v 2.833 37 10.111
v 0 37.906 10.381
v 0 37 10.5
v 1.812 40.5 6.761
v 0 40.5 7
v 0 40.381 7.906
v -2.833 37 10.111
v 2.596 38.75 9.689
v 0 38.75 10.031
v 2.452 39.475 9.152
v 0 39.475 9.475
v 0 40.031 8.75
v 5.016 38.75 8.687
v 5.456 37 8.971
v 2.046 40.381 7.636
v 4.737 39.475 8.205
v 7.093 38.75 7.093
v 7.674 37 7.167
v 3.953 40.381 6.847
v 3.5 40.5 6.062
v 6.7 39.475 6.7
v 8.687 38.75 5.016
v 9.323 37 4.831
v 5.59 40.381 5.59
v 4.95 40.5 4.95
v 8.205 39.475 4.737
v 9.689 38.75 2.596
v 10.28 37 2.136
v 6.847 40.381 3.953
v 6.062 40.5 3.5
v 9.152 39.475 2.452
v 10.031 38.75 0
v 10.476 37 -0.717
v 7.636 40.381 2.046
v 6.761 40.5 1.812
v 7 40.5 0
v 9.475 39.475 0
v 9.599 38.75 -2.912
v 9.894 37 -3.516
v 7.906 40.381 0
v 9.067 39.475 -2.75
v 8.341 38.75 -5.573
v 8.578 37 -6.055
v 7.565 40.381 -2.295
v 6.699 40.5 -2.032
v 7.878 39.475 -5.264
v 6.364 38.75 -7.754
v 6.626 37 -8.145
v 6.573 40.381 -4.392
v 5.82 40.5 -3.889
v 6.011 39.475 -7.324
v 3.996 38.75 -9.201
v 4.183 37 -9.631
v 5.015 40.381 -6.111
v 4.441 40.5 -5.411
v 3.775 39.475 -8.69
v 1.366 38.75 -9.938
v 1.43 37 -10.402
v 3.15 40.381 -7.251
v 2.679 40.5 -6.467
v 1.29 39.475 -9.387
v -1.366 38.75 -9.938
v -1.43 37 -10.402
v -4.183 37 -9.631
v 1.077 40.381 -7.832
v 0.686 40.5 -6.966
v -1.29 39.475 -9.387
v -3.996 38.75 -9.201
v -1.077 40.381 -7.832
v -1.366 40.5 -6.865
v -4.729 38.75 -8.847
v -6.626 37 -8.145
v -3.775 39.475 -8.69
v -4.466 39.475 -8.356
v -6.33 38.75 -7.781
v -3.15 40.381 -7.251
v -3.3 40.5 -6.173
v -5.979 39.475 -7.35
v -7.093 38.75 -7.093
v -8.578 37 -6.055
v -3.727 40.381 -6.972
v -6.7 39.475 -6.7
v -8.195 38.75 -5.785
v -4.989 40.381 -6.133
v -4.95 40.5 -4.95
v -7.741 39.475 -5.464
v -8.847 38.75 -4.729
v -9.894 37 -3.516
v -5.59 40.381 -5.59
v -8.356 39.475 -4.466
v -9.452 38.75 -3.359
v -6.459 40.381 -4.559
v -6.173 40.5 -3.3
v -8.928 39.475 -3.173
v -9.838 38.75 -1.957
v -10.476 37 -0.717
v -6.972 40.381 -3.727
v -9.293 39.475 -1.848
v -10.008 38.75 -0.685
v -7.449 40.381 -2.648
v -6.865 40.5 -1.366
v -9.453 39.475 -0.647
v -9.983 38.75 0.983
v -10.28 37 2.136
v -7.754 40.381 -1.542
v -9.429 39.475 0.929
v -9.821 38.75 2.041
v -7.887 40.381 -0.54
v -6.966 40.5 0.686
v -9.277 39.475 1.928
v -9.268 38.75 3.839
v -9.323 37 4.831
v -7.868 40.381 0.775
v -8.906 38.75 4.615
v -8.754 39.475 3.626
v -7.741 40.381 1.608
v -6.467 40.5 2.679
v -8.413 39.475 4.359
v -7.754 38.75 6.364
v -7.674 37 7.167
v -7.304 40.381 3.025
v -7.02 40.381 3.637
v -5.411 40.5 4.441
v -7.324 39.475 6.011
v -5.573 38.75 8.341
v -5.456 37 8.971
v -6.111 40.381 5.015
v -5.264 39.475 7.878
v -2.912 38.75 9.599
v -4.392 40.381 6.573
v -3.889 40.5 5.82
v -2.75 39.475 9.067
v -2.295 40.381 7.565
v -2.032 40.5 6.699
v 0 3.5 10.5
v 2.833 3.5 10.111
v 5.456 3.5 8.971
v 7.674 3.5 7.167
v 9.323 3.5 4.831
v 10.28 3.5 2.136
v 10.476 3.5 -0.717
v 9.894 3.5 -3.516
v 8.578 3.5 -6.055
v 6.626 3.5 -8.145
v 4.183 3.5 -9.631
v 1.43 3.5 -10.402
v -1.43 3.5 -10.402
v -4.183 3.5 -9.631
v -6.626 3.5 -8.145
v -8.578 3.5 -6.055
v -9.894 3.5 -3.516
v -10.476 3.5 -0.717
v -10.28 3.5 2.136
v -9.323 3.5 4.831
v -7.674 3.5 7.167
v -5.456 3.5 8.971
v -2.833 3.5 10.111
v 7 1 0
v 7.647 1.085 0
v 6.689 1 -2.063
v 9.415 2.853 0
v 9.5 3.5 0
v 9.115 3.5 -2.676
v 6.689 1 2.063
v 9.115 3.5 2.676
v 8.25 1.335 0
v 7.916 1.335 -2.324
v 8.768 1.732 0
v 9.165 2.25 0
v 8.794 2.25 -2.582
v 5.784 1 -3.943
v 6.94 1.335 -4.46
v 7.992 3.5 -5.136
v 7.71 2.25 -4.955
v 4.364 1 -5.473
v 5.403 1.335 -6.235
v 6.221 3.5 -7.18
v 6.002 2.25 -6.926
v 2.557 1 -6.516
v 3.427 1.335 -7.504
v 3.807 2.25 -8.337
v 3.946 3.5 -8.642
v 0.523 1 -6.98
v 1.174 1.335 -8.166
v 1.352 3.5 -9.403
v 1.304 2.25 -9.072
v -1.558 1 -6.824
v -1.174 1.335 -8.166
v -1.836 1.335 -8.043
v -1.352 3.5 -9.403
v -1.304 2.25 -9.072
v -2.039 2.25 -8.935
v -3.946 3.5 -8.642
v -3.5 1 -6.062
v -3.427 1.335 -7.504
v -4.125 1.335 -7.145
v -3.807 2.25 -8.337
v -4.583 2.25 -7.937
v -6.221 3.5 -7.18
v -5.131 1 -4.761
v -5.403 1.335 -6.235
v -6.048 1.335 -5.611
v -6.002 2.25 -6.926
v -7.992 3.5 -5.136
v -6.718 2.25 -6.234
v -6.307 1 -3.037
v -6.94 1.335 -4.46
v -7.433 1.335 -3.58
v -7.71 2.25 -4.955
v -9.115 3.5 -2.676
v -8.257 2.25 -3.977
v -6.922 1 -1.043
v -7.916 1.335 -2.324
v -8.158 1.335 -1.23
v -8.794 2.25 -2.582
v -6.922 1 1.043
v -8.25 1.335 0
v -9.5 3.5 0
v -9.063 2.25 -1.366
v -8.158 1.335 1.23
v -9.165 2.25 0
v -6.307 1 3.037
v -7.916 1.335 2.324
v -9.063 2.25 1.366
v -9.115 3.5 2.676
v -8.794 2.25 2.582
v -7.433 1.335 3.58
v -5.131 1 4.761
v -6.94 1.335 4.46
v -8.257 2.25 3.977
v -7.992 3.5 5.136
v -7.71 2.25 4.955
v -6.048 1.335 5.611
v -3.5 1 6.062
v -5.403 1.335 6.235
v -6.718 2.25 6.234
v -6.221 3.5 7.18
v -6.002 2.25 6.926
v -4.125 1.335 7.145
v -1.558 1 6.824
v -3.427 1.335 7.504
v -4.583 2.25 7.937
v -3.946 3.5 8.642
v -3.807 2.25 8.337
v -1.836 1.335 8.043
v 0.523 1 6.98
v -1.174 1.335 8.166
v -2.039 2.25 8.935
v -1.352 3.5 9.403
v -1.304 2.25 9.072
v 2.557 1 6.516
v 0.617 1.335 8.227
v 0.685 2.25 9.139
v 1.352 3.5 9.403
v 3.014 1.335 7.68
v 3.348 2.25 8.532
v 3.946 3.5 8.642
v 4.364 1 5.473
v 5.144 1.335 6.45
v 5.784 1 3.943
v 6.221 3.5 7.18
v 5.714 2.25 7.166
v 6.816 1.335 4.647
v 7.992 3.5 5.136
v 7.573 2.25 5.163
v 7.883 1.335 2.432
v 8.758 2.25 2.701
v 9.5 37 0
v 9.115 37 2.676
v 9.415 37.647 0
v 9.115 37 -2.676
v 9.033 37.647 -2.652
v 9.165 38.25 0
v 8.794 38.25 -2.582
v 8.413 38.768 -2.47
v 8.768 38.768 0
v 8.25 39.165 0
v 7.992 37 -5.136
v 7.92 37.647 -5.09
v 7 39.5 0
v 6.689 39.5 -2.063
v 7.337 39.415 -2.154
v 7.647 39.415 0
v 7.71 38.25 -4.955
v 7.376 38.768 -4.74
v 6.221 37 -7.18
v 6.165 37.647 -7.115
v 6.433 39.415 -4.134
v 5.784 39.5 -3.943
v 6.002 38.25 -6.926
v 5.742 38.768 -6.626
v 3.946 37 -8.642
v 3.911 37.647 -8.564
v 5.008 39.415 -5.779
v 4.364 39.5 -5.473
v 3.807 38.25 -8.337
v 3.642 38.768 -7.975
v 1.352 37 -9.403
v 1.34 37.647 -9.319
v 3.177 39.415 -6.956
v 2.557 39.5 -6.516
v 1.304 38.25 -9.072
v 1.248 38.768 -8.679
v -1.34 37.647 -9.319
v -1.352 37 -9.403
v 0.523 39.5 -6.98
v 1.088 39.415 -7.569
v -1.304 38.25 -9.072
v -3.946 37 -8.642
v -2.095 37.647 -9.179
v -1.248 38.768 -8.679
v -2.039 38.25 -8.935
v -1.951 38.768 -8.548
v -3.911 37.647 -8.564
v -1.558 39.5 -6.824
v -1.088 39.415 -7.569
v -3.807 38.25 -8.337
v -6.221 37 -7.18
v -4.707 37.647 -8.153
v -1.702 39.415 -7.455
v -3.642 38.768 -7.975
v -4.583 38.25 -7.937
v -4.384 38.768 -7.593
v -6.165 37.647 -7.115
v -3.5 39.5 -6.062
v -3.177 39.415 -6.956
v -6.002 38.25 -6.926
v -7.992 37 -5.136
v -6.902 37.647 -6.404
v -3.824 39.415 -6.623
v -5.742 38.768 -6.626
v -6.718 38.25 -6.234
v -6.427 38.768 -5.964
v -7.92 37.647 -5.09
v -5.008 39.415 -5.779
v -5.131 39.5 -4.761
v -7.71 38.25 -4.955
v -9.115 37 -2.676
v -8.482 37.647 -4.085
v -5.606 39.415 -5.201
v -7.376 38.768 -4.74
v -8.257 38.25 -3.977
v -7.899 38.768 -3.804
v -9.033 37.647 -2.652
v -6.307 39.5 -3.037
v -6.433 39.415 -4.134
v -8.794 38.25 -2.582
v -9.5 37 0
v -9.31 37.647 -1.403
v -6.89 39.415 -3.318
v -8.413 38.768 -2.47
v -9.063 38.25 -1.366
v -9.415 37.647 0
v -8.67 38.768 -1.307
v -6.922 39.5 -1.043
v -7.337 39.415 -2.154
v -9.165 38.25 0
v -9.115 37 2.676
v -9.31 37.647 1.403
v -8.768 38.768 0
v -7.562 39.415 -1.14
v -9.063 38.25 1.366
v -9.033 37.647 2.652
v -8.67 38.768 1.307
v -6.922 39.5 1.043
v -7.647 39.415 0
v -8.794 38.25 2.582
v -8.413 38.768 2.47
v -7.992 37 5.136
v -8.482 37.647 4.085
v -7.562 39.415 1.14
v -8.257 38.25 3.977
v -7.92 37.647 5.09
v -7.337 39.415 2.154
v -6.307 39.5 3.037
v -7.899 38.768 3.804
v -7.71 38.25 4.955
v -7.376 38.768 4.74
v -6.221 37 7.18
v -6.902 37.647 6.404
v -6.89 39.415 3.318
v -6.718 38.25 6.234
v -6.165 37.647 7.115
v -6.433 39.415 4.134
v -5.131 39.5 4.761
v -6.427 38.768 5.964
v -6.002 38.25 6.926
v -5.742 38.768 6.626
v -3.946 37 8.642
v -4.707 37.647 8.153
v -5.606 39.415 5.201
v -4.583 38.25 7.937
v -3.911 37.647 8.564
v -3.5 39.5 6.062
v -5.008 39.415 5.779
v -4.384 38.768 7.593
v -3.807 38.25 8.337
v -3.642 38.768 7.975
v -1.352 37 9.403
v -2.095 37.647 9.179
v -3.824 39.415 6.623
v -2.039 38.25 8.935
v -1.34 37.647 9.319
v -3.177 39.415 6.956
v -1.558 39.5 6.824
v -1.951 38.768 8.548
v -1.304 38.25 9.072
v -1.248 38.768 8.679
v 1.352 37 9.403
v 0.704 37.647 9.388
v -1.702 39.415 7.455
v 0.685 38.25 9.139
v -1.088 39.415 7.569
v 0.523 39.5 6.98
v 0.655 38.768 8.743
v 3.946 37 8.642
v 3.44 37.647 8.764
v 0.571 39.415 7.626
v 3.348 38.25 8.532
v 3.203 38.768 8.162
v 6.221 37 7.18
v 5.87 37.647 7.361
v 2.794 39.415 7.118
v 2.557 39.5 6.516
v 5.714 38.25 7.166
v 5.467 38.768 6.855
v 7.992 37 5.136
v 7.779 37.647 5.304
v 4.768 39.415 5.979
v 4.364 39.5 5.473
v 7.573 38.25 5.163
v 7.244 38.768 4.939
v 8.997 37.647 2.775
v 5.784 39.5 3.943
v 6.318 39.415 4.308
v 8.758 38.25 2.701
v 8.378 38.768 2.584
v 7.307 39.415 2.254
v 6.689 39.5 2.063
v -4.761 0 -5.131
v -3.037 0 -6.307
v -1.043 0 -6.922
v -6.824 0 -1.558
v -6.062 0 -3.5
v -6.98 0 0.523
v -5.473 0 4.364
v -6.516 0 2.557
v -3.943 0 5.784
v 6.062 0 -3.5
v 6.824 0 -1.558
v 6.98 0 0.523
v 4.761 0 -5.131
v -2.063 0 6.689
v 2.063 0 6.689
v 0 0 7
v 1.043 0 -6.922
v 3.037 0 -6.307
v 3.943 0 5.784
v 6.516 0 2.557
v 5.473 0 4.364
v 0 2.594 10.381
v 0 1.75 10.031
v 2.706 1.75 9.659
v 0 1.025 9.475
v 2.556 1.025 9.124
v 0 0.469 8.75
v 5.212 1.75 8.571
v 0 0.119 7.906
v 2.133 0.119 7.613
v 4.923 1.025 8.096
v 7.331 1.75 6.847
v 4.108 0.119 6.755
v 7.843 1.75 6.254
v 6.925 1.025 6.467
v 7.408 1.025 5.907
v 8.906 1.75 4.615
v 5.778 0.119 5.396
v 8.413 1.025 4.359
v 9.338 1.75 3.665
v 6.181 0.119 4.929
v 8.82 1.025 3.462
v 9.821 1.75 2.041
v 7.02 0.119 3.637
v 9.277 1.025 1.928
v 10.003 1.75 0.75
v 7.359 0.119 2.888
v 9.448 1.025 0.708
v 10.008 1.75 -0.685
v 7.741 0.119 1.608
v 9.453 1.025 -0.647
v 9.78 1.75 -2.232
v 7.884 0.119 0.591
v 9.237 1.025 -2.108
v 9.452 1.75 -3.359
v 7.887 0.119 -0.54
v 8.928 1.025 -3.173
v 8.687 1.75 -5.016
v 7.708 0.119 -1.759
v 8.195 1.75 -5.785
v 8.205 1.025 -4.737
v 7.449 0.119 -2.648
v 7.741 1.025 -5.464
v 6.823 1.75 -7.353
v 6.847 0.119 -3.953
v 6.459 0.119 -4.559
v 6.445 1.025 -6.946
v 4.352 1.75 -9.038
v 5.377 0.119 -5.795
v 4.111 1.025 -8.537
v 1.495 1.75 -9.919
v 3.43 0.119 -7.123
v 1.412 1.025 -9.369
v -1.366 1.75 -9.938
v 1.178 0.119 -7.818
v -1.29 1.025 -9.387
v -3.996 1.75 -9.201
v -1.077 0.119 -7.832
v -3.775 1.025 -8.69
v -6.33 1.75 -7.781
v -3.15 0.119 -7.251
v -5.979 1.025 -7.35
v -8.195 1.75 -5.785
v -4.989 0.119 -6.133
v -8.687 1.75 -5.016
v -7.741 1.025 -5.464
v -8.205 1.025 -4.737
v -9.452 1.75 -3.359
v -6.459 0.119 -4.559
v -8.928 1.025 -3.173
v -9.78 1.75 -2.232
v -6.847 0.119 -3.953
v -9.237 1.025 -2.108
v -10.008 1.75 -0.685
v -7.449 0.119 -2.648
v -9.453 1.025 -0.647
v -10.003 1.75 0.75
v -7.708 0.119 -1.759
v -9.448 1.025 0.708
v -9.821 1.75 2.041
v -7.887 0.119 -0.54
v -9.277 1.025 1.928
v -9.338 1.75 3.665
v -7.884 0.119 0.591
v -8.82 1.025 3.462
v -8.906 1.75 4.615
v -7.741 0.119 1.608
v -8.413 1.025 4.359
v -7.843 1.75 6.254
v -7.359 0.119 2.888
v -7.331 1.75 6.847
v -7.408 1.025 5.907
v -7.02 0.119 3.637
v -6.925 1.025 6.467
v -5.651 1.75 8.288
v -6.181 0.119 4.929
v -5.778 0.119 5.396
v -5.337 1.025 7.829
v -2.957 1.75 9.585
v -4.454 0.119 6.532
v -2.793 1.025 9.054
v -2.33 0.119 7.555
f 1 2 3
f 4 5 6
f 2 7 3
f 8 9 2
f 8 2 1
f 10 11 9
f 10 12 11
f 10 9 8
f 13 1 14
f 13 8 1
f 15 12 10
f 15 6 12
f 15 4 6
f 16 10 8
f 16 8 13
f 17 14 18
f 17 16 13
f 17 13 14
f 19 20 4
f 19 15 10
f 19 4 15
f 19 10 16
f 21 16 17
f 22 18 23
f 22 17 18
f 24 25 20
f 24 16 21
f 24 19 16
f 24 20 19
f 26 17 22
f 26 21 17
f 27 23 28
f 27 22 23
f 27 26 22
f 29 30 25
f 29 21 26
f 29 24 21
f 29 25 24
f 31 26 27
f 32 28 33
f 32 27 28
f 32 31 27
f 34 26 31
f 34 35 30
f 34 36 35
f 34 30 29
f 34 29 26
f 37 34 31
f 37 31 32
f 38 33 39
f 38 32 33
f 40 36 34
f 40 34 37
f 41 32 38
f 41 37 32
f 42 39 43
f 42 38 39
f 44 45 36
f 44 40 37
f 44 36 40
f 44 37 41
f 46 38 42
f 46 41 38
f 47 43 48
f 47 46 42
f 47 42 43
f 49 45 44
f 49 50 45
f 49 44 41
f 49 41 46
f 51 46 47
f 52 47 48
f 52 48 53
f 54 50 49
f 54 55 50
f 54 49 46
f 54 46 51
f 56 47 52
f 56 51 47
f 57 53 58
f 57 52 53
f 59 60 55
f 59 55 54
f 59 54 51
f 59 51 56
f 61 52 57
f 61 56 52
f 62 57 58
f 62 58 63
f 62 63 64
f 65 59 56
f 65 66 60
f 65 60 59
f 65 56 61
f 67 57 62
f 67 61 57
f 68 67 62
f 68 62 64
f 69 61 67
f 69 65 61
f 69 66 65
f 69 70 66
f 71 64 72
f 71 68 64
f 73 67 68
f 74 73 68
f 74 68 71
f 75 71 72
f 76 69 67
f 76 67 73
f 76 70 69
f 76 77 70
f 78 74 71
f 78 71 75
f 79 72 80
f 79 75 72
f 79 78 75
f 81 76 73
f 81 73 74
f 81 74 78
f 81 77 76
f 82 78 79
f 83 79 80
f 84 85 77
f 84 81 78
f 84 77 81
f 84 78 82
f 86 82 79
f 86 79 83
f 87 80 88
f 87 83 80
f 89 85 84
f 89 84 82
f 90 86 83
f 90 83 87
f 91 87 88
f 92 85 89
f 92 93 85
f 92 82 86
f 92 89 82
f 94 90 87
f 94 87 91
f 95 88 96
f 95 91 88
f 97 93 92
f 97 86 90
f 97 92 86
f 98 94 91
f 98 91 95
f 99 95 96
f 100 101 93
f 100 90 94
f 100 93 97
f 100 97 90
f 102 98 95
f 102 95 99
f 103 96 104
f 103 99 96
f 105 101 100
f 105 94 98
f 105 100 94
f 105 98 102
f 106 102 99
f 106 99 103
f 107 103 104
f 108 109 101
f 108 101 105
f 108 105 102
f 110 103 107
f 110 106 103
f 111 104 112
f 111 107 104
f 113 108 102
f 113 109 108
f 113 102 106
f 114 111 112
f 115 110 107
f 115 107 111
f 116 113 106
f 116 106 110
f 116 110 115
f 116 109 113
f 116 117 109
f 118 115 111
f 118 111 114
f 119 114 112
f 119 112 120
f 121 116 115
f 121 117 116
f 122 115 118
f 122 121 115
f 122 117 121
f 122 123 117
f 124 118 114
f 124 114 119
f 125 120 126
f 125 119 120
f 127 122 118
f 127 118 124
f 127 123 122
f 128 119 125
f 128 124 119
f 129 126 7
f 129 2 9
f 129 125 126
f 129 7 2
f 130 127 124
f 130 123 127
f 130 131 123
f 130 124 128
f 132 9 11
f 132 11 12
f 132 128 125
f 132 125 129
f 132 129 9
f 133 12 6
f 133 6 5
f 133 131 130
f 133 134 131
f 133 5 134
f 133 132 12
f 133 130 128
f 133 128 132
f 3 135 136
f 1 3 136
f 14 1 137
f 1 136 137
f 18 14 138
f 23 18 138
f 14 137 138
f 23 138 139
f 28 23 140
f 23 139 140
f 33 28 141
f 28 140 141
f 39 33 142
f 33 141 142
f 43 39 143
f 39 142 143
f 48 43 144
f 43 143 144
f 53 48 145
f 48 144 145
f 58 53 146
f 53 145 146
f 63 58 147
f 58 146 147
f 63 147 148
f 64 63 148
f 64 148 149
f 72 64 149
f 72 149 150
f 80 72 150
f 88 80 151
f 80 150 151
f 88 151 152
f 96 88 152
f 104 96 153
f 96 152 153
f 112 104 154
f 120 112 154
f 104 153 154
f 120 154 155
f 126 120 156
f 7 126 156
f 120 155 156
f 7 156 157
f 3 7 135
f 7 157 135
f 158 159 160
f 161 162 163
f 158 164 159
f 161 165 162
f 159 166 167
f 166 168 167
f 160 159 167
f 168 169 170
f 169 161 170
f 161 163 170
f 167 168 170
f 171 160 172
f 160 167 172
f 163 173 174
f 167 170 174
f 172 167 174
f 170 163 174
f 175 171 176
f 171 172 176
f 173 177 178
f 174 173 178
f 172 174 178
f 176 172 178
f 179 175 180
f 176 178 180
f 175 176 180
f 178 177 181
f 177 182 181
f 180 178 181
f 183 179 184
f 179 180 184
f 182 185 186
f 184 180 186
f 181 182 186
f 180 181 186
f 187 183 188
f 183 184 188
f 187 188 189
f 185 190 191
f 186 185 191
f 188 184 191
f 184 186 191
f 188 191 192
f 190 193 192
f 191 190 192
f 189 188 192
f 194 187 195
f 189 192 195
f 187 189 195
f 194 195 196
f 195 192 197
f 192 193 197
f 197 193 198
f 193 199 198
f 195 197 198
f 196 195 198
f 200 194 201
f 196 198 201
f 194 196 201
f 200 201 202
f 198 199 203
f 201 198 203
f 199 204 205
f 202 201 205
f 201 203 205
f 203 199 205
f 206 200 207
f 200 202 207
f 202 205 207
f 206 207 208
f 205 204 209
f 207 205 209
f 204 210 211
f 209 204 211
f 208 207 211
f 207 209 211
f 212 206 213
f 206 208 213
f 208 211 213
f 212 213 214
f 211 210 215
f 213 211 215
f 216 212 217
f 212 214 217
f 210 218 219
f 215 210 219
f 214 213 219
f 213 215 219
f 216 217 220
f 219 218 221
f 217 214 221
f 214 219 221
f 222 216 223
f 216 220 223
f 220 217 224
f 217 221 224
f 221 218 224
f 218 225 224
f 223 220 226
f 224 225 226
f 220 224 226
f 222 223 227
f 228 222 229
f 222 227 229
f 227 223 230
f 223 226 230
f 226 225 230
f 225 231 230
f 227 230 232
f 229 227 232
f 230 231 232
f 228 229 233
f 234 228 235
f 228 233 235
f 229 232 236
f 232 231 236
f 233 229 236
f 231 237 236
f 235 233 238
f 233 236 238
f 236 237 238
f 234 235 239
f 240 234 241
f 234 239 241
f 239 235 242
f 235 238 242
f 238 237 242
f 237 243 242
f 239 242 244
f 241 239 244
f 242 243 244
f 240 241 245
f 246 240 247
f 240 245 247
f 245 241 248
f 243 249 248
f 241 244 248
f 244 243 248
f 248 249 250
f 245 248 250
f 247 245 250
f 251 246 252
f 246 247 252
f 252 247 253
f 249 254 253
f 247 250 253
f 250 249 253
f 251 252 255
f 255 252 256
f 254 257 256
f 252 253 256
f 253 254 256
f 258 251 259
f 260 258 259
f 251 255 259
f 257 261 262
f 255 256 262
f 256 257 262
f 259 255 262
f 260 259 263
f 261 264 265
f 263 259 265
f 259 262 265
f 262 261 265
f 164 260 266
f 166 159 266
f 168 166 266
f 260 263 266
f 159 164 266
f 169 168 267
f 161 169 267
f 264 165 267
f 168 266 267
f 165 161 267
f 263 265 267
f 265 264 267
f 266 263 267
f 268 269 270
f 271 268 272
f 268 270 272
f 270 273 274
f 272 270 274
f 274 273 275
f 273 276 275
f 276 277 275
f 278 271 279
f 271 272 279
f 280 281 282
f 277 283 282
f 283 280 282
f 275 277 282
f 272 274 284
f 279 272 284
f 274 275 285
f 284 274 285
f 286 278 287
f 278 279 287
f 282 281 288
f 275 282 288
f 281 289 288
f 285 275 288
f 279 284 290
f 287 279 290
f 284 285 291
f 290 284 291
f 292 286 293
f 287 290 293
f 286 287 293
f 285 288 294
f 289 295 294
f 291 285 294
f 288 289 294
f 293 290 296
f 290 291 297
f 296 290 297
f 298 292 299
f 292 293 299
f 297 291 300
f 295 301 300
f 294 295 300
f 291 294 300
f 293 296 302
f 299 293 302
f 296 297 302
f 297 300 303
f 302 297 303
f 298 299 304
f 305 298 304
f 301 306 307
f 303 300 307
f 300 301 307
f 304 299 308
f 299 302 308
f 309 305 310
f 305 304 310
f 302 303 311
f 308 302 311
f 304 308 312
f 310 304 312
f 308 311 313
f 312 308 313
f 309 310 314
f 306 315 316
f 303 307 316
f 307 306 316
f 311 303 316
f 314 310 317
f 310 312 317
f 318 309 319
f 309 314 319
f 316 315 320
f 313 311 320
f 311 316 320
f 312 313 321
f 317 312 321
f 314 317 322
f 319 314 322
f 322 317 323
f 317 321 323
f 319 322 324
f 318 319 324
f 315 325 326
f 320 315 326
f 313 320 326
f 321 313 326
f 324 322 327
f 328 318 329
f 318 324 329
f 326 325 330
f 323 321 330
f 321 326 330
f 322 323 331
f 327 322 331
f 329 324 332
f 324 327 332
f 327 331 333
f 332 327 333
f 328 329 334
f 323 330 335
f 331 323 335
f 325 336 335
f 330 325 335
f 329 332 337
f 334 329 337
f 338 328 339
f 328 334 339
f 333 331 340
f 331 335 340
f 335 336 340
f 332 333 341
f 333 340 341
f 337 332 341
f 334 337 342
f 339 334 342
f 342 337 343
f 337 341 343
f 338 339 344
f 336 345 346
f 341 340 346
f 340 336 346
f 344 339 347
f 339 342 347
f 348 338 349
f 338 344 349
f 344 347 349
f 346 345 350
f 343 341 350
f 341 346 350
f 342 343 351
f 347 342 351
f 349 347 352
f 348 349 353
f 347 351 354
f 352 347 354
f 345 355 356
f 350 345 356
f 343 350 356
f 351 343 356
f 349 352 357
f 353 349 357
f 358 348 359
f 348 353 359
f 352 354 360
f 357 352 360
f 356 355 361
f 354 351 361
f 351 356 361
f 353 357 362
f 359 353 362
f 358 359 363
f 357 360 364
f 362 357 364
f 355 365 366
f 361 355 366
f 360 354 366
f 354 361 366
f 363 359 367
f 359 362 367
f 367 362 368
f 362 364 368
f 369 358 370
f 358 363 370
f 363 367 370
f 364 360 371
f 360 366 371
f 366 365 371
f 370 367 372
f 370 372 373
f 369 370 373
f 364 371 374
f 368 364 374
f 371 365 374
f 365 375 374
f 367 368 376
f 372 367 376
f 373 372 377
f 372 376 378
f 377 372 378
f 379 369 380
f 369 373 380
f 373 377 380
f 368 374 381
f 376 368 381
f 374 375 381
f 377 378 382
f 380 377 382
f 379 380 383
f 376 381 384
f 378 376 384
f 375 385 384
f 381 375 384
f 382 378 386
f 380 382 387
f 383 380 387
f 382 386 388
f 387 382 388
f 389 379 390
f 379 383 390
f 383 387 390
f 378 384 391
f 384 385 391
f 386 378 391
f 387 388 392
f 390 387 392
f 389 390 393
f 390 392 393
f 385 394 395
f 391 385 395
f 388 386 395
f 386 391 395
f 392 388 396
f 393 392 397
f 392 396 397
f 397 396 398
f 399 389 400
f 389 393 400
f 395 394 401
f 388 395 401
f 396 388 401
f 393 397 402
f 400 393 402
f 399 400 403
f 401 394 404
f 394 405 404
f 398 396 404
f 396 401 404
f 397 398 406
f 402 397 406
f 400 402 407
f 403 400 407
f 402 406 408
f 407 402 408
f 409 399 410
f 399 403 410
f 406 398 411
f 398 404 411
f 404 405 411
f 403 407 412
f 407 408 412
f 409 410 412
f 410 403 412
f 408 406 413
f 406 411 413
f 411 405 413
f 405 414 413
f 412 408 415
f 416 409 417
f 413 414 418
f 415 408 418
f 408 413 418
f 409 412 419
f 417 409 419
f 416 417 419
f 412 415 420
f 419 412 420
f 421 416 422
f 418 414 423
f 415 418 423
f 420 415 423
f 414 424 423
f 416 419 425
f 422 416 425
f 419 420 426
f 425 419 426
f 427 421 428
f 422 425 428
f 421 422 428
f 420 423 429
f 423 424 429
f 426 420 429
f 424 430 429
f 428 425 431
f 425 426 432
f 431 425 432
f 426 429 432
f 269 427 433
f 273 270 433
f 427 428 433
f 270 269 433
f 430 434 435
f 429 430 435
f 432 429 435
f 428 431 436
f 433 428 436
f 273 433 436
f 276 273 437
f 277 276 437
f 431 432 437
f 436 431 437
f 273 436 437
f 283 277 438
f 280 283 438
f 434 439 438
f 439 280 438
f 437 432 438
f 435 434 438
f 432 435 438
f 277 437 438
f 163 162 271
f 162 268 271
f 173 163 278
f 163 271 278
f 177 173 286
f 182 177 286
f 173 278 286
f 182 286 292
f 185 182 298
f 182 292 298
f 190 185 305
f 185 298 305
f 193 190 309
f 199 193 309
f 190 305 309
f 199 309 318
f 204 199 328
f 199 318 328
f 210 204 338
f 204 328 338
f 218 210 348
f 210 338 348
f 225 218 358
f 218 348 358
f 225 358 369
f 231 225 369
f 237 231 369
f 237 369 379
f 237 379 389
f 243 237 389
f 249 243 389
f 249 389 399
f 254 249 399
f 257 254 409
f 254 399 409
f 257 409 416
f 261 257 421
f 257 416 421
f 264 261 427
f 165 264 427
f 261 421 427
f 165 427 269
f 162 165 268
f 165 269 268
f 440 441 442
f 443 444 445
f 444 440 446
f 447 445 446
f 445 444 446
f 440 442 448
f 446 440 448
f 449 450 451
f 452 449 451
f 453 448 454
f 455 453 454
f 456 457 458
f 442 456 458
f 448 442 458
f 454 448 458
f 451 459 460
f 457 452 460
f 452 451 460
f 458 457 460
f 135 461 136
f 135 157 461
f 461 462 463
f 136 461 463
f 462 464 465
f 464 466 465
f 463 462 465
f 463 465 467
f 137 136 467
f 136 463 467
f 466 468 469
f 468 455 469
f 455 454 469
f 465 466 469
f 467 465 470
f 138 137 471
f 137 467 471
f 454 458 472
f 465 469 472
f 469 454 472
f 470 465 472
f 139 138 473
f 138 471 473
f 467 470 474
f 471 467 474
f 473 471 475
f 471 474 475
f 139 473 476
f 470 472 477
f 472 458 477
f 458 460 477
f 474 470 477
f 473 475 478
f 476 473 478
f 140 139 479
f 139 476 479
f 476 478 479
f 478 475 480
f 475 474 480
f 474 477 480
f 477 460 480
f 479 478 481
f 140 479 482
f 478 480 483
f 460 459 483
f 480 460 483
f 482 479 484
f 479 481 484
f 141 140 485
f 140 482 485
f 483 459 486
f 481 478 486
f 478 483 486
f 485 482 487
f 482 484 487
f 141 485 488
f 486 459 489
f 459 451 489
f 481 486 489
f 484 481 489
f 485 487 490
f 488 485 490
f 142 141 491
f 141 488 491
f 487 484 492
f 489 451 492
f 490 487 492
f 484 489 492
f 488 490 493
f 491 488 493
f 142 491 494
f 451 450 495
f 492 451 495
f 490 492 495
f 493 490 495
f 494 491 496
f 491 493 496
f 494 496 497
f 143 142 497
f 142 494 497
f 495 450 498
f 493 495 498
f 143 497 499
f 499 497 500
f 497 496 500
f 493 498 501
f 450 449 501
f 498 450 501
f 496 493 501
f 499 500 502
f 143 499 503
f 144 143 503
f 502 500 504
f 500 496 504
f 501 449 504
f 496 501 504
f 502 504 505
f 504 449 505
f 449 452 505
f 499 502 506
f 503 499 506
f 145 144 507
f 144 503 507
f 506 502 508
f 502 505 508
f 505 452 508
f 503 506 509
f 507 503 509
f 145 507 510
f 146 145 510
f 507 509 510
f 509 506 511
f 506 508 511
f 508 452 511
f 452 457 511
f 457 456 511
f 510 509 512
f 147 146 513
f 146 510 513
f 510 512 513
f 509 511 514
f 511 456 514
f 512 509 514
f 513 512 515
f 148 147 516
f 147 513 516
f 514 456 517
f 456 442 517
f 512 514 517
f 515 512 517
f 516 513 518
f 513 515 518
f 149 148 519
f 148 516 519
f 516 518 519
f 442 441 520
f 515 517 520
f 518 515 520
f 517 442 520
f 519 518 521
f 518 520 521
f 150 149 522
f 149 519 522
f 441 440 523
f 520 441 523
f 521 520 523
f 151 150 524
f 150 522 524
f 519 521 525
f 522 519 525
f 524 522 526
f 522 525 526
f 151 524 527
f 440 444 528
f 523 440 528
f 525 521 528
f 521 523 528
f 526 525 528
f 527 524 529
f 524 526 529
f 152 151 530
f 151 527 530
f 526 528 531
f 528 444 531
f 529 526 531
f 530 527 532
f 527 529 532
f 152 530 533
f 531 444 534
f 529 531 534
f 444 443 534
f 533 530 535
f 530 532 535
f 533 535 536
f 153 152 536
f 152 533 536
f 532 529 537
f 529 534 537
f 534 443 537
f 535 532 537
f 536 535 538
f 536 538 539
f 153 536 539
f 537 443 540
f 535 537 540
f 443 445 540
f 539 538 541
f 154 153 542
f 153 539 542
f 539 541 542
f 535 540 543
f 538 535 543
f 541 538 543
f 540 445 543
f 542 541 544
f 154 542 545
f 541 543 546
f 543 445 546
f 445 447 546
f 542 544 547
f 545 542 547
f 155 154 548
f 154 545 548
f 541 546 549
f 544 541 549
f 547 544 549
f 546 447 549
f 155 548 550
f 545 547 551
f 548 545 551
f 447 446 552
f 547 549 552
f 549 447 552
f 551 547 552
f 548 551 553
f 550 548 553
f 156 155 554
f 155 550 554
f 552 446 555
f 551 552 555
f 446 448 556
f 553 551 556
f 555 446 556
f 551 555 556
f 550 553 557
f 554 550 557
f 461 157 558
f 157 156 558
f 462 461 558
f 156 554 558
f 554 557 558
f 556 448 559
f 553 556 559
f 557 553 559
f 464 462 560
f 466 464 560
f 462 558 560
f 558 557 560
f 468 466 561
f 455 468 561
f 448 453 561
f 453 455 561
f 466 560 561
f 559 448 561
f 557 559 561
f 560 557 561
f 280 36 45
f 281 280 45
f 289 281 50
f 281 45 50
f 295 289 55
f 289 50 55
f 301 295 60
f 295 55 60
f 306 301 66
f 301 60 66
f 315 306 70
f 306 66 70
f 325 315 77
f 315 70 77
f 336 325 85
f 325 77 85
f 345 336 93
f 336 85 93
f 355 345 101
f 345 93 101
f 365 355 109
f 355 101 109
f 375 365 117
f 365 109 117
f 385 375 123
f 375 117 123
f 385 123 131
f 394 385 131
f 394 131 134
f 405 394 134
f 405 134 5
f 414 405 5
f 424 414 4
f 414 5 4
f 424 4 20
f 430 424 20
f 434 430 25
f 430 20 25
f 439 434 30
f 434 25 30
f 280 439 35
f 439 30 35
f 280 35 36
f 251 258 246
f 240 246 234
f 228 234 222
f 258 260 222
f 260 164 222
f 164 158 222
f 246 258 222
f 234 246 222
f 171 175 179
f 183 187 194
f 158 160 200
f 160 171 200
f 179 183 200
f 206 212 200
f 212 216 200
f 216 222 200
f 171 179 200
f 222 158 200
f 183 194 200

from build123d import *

# Parameters (mm, degrees)
SKETCH1_R           = 10.5
BOSS_EXTRUDE1_DEPTH = 40.5
FILLET1_R           = 3.5


# Read off the part's stored shape, not the designer's step: Shell4
with BuildPart() as part:
    # Sketch1 → Boss-Extrude1 (new body)
    with BuildSketch(Plane(origin=(0, 0, 0), x_dir=(1, 0, 0), z_dir=(0, 1, 0))):
        with Locations(Location((0, 0, 0), (0, 0, 270))):
            Circle(SKETCH1_R)
    extrude(amount=BOSS_EXTRUDE1_DEPTH)

    # Fillet1
    fillet1_edges = [part.edges().sort_by_distance(p)[0] for p in [
        (0, 0, -10.5),
        (0, 40.5, -10.5),
    ]]
    fillet(fillet1_edges, radius=FILLET1_R)

    # Shell4 outline → Shell4 (revolve, cut)
    with BuildSketch(Plane.XY):
        with BuildLine():
            Line((0, 1), (7, 1))
            ThreePointArc((7, 1), (8.767766953, 1.732233047), (9.5, 3.5))
            Line((9.5, 3.5), (9.5, 37))
            ThreePointArc((9.5, 37), (8.767766953, 38.767766953), (7, 39.5))
            Line((7, 39.5), (7, 40.5))
            Line((7, 40.5), (0, 40.5))
            Line((0, 40.5), (0, 1))
        make_face()
    revolve(axis=Axis((0, 0, 0), (0, 1, 0)), mode=Mode.SUBTRACT)


solid = part.part
